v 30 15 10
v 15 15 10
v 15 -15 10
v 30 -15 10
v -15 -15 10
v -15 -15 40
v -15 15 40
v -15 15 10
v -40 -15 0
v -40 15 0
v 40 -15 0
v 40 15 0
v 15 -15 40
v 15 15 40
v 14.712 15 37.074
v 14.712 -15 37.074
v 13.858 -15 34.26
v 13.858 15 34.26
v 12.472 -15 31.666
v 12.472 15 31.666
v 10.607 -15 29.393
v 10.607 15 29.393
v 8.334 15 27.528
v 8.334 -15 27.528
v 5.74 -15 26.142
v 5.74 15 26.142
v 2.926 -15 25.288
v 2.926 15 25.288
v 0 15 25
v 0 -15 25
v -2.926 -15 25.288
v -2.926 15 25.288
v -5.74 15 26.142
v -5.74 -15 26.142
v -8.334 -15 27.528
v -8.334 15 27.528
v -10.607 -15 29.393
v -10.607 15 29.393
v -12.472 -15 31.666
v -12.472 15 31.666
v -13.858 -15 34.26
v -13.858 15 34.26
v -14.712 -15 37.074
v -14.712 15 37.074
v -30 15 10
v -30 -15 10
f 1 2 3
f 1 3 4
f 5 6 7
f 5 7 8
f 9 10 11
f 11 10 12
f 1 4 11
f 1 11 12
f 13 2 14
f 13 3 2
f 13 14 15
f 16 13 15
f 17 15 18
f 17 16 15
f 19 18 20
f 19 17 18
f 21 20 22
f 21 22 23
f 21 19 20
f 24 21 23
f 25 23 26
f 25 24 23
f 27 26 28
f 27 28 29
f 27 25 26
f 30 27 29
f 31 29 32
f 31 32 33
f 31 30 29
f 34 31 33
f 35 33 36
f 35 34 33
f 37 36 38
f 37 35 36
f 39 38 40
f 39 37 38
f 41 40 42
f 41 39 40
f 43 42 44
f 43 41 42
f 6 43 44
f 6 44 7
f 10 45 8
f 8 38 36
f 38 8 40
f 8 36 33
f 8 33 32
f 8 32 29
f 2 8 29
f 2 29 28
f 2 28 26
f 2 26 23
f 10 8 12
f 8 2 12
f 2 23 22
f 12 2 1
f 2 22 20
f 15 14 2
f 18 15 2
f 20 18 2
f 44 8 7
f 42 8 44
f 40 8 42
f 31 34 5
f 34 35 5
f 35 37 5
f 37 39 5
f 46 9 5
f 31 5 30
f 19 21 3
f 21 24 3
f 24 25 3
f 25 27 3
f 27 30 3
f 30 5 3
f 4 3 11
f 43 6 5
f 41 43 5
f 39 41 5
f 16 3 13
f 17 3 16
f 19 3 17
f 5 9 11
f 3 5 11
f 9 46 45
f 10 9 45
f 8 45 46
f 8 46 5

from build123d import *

# Parameters (mm, degrees)
F0_W     = 80
F0_H     = 30
F1_DEPTH = 10
F2_SIZE  = 9.99999
F4_DEPTH = 15
F5_DEPTH = 15


# Not quite as in the source:
# - a fillet or chamfer is up to 0.001 mm smaller than in the source, because OpenCascade refuses the exact size


with BuildPart() as f1:
    # F0 (on Top) → F1 (new body)
    with BuildSketch(Plane.XY):
        Rectangle(F0_W, F0_H)
    extrude(amount=F1_DEPTH)

    # F2 (size 10 in the source; OpenCascade refuses exactly that, so slightly less here)
    f2_edges = [f1.edges().sort_by_distance(p)[0] for p in [
        (-40, 0, 10),
        (40, 0, 10),
    ]]
    chamfer(f2_edges, length=F2_SIZE)

    # F3 (on Front) → F4 (join)
    with BuildSketch(Plane.XZ):
        with BuildLine():
            Line((-15, 10), (15, 10))
            Line((15, 10), (15, 40))
            ThreePointArc((15, 40), (0, 25), (-15, 40))
            Line((-15, 40), (-15, 10))
        make_face()
    extrude(amount=F4_DEPTH)

    # F5 (add): a face of the model
    f5_faces = [f1.faces().sort_by_distance(p)[0] for p in [
        (0, 0, 19.4171231702),
    ]]
    extrude(f5_faces, amount=F5_DEPTH)


solid = f1.part
